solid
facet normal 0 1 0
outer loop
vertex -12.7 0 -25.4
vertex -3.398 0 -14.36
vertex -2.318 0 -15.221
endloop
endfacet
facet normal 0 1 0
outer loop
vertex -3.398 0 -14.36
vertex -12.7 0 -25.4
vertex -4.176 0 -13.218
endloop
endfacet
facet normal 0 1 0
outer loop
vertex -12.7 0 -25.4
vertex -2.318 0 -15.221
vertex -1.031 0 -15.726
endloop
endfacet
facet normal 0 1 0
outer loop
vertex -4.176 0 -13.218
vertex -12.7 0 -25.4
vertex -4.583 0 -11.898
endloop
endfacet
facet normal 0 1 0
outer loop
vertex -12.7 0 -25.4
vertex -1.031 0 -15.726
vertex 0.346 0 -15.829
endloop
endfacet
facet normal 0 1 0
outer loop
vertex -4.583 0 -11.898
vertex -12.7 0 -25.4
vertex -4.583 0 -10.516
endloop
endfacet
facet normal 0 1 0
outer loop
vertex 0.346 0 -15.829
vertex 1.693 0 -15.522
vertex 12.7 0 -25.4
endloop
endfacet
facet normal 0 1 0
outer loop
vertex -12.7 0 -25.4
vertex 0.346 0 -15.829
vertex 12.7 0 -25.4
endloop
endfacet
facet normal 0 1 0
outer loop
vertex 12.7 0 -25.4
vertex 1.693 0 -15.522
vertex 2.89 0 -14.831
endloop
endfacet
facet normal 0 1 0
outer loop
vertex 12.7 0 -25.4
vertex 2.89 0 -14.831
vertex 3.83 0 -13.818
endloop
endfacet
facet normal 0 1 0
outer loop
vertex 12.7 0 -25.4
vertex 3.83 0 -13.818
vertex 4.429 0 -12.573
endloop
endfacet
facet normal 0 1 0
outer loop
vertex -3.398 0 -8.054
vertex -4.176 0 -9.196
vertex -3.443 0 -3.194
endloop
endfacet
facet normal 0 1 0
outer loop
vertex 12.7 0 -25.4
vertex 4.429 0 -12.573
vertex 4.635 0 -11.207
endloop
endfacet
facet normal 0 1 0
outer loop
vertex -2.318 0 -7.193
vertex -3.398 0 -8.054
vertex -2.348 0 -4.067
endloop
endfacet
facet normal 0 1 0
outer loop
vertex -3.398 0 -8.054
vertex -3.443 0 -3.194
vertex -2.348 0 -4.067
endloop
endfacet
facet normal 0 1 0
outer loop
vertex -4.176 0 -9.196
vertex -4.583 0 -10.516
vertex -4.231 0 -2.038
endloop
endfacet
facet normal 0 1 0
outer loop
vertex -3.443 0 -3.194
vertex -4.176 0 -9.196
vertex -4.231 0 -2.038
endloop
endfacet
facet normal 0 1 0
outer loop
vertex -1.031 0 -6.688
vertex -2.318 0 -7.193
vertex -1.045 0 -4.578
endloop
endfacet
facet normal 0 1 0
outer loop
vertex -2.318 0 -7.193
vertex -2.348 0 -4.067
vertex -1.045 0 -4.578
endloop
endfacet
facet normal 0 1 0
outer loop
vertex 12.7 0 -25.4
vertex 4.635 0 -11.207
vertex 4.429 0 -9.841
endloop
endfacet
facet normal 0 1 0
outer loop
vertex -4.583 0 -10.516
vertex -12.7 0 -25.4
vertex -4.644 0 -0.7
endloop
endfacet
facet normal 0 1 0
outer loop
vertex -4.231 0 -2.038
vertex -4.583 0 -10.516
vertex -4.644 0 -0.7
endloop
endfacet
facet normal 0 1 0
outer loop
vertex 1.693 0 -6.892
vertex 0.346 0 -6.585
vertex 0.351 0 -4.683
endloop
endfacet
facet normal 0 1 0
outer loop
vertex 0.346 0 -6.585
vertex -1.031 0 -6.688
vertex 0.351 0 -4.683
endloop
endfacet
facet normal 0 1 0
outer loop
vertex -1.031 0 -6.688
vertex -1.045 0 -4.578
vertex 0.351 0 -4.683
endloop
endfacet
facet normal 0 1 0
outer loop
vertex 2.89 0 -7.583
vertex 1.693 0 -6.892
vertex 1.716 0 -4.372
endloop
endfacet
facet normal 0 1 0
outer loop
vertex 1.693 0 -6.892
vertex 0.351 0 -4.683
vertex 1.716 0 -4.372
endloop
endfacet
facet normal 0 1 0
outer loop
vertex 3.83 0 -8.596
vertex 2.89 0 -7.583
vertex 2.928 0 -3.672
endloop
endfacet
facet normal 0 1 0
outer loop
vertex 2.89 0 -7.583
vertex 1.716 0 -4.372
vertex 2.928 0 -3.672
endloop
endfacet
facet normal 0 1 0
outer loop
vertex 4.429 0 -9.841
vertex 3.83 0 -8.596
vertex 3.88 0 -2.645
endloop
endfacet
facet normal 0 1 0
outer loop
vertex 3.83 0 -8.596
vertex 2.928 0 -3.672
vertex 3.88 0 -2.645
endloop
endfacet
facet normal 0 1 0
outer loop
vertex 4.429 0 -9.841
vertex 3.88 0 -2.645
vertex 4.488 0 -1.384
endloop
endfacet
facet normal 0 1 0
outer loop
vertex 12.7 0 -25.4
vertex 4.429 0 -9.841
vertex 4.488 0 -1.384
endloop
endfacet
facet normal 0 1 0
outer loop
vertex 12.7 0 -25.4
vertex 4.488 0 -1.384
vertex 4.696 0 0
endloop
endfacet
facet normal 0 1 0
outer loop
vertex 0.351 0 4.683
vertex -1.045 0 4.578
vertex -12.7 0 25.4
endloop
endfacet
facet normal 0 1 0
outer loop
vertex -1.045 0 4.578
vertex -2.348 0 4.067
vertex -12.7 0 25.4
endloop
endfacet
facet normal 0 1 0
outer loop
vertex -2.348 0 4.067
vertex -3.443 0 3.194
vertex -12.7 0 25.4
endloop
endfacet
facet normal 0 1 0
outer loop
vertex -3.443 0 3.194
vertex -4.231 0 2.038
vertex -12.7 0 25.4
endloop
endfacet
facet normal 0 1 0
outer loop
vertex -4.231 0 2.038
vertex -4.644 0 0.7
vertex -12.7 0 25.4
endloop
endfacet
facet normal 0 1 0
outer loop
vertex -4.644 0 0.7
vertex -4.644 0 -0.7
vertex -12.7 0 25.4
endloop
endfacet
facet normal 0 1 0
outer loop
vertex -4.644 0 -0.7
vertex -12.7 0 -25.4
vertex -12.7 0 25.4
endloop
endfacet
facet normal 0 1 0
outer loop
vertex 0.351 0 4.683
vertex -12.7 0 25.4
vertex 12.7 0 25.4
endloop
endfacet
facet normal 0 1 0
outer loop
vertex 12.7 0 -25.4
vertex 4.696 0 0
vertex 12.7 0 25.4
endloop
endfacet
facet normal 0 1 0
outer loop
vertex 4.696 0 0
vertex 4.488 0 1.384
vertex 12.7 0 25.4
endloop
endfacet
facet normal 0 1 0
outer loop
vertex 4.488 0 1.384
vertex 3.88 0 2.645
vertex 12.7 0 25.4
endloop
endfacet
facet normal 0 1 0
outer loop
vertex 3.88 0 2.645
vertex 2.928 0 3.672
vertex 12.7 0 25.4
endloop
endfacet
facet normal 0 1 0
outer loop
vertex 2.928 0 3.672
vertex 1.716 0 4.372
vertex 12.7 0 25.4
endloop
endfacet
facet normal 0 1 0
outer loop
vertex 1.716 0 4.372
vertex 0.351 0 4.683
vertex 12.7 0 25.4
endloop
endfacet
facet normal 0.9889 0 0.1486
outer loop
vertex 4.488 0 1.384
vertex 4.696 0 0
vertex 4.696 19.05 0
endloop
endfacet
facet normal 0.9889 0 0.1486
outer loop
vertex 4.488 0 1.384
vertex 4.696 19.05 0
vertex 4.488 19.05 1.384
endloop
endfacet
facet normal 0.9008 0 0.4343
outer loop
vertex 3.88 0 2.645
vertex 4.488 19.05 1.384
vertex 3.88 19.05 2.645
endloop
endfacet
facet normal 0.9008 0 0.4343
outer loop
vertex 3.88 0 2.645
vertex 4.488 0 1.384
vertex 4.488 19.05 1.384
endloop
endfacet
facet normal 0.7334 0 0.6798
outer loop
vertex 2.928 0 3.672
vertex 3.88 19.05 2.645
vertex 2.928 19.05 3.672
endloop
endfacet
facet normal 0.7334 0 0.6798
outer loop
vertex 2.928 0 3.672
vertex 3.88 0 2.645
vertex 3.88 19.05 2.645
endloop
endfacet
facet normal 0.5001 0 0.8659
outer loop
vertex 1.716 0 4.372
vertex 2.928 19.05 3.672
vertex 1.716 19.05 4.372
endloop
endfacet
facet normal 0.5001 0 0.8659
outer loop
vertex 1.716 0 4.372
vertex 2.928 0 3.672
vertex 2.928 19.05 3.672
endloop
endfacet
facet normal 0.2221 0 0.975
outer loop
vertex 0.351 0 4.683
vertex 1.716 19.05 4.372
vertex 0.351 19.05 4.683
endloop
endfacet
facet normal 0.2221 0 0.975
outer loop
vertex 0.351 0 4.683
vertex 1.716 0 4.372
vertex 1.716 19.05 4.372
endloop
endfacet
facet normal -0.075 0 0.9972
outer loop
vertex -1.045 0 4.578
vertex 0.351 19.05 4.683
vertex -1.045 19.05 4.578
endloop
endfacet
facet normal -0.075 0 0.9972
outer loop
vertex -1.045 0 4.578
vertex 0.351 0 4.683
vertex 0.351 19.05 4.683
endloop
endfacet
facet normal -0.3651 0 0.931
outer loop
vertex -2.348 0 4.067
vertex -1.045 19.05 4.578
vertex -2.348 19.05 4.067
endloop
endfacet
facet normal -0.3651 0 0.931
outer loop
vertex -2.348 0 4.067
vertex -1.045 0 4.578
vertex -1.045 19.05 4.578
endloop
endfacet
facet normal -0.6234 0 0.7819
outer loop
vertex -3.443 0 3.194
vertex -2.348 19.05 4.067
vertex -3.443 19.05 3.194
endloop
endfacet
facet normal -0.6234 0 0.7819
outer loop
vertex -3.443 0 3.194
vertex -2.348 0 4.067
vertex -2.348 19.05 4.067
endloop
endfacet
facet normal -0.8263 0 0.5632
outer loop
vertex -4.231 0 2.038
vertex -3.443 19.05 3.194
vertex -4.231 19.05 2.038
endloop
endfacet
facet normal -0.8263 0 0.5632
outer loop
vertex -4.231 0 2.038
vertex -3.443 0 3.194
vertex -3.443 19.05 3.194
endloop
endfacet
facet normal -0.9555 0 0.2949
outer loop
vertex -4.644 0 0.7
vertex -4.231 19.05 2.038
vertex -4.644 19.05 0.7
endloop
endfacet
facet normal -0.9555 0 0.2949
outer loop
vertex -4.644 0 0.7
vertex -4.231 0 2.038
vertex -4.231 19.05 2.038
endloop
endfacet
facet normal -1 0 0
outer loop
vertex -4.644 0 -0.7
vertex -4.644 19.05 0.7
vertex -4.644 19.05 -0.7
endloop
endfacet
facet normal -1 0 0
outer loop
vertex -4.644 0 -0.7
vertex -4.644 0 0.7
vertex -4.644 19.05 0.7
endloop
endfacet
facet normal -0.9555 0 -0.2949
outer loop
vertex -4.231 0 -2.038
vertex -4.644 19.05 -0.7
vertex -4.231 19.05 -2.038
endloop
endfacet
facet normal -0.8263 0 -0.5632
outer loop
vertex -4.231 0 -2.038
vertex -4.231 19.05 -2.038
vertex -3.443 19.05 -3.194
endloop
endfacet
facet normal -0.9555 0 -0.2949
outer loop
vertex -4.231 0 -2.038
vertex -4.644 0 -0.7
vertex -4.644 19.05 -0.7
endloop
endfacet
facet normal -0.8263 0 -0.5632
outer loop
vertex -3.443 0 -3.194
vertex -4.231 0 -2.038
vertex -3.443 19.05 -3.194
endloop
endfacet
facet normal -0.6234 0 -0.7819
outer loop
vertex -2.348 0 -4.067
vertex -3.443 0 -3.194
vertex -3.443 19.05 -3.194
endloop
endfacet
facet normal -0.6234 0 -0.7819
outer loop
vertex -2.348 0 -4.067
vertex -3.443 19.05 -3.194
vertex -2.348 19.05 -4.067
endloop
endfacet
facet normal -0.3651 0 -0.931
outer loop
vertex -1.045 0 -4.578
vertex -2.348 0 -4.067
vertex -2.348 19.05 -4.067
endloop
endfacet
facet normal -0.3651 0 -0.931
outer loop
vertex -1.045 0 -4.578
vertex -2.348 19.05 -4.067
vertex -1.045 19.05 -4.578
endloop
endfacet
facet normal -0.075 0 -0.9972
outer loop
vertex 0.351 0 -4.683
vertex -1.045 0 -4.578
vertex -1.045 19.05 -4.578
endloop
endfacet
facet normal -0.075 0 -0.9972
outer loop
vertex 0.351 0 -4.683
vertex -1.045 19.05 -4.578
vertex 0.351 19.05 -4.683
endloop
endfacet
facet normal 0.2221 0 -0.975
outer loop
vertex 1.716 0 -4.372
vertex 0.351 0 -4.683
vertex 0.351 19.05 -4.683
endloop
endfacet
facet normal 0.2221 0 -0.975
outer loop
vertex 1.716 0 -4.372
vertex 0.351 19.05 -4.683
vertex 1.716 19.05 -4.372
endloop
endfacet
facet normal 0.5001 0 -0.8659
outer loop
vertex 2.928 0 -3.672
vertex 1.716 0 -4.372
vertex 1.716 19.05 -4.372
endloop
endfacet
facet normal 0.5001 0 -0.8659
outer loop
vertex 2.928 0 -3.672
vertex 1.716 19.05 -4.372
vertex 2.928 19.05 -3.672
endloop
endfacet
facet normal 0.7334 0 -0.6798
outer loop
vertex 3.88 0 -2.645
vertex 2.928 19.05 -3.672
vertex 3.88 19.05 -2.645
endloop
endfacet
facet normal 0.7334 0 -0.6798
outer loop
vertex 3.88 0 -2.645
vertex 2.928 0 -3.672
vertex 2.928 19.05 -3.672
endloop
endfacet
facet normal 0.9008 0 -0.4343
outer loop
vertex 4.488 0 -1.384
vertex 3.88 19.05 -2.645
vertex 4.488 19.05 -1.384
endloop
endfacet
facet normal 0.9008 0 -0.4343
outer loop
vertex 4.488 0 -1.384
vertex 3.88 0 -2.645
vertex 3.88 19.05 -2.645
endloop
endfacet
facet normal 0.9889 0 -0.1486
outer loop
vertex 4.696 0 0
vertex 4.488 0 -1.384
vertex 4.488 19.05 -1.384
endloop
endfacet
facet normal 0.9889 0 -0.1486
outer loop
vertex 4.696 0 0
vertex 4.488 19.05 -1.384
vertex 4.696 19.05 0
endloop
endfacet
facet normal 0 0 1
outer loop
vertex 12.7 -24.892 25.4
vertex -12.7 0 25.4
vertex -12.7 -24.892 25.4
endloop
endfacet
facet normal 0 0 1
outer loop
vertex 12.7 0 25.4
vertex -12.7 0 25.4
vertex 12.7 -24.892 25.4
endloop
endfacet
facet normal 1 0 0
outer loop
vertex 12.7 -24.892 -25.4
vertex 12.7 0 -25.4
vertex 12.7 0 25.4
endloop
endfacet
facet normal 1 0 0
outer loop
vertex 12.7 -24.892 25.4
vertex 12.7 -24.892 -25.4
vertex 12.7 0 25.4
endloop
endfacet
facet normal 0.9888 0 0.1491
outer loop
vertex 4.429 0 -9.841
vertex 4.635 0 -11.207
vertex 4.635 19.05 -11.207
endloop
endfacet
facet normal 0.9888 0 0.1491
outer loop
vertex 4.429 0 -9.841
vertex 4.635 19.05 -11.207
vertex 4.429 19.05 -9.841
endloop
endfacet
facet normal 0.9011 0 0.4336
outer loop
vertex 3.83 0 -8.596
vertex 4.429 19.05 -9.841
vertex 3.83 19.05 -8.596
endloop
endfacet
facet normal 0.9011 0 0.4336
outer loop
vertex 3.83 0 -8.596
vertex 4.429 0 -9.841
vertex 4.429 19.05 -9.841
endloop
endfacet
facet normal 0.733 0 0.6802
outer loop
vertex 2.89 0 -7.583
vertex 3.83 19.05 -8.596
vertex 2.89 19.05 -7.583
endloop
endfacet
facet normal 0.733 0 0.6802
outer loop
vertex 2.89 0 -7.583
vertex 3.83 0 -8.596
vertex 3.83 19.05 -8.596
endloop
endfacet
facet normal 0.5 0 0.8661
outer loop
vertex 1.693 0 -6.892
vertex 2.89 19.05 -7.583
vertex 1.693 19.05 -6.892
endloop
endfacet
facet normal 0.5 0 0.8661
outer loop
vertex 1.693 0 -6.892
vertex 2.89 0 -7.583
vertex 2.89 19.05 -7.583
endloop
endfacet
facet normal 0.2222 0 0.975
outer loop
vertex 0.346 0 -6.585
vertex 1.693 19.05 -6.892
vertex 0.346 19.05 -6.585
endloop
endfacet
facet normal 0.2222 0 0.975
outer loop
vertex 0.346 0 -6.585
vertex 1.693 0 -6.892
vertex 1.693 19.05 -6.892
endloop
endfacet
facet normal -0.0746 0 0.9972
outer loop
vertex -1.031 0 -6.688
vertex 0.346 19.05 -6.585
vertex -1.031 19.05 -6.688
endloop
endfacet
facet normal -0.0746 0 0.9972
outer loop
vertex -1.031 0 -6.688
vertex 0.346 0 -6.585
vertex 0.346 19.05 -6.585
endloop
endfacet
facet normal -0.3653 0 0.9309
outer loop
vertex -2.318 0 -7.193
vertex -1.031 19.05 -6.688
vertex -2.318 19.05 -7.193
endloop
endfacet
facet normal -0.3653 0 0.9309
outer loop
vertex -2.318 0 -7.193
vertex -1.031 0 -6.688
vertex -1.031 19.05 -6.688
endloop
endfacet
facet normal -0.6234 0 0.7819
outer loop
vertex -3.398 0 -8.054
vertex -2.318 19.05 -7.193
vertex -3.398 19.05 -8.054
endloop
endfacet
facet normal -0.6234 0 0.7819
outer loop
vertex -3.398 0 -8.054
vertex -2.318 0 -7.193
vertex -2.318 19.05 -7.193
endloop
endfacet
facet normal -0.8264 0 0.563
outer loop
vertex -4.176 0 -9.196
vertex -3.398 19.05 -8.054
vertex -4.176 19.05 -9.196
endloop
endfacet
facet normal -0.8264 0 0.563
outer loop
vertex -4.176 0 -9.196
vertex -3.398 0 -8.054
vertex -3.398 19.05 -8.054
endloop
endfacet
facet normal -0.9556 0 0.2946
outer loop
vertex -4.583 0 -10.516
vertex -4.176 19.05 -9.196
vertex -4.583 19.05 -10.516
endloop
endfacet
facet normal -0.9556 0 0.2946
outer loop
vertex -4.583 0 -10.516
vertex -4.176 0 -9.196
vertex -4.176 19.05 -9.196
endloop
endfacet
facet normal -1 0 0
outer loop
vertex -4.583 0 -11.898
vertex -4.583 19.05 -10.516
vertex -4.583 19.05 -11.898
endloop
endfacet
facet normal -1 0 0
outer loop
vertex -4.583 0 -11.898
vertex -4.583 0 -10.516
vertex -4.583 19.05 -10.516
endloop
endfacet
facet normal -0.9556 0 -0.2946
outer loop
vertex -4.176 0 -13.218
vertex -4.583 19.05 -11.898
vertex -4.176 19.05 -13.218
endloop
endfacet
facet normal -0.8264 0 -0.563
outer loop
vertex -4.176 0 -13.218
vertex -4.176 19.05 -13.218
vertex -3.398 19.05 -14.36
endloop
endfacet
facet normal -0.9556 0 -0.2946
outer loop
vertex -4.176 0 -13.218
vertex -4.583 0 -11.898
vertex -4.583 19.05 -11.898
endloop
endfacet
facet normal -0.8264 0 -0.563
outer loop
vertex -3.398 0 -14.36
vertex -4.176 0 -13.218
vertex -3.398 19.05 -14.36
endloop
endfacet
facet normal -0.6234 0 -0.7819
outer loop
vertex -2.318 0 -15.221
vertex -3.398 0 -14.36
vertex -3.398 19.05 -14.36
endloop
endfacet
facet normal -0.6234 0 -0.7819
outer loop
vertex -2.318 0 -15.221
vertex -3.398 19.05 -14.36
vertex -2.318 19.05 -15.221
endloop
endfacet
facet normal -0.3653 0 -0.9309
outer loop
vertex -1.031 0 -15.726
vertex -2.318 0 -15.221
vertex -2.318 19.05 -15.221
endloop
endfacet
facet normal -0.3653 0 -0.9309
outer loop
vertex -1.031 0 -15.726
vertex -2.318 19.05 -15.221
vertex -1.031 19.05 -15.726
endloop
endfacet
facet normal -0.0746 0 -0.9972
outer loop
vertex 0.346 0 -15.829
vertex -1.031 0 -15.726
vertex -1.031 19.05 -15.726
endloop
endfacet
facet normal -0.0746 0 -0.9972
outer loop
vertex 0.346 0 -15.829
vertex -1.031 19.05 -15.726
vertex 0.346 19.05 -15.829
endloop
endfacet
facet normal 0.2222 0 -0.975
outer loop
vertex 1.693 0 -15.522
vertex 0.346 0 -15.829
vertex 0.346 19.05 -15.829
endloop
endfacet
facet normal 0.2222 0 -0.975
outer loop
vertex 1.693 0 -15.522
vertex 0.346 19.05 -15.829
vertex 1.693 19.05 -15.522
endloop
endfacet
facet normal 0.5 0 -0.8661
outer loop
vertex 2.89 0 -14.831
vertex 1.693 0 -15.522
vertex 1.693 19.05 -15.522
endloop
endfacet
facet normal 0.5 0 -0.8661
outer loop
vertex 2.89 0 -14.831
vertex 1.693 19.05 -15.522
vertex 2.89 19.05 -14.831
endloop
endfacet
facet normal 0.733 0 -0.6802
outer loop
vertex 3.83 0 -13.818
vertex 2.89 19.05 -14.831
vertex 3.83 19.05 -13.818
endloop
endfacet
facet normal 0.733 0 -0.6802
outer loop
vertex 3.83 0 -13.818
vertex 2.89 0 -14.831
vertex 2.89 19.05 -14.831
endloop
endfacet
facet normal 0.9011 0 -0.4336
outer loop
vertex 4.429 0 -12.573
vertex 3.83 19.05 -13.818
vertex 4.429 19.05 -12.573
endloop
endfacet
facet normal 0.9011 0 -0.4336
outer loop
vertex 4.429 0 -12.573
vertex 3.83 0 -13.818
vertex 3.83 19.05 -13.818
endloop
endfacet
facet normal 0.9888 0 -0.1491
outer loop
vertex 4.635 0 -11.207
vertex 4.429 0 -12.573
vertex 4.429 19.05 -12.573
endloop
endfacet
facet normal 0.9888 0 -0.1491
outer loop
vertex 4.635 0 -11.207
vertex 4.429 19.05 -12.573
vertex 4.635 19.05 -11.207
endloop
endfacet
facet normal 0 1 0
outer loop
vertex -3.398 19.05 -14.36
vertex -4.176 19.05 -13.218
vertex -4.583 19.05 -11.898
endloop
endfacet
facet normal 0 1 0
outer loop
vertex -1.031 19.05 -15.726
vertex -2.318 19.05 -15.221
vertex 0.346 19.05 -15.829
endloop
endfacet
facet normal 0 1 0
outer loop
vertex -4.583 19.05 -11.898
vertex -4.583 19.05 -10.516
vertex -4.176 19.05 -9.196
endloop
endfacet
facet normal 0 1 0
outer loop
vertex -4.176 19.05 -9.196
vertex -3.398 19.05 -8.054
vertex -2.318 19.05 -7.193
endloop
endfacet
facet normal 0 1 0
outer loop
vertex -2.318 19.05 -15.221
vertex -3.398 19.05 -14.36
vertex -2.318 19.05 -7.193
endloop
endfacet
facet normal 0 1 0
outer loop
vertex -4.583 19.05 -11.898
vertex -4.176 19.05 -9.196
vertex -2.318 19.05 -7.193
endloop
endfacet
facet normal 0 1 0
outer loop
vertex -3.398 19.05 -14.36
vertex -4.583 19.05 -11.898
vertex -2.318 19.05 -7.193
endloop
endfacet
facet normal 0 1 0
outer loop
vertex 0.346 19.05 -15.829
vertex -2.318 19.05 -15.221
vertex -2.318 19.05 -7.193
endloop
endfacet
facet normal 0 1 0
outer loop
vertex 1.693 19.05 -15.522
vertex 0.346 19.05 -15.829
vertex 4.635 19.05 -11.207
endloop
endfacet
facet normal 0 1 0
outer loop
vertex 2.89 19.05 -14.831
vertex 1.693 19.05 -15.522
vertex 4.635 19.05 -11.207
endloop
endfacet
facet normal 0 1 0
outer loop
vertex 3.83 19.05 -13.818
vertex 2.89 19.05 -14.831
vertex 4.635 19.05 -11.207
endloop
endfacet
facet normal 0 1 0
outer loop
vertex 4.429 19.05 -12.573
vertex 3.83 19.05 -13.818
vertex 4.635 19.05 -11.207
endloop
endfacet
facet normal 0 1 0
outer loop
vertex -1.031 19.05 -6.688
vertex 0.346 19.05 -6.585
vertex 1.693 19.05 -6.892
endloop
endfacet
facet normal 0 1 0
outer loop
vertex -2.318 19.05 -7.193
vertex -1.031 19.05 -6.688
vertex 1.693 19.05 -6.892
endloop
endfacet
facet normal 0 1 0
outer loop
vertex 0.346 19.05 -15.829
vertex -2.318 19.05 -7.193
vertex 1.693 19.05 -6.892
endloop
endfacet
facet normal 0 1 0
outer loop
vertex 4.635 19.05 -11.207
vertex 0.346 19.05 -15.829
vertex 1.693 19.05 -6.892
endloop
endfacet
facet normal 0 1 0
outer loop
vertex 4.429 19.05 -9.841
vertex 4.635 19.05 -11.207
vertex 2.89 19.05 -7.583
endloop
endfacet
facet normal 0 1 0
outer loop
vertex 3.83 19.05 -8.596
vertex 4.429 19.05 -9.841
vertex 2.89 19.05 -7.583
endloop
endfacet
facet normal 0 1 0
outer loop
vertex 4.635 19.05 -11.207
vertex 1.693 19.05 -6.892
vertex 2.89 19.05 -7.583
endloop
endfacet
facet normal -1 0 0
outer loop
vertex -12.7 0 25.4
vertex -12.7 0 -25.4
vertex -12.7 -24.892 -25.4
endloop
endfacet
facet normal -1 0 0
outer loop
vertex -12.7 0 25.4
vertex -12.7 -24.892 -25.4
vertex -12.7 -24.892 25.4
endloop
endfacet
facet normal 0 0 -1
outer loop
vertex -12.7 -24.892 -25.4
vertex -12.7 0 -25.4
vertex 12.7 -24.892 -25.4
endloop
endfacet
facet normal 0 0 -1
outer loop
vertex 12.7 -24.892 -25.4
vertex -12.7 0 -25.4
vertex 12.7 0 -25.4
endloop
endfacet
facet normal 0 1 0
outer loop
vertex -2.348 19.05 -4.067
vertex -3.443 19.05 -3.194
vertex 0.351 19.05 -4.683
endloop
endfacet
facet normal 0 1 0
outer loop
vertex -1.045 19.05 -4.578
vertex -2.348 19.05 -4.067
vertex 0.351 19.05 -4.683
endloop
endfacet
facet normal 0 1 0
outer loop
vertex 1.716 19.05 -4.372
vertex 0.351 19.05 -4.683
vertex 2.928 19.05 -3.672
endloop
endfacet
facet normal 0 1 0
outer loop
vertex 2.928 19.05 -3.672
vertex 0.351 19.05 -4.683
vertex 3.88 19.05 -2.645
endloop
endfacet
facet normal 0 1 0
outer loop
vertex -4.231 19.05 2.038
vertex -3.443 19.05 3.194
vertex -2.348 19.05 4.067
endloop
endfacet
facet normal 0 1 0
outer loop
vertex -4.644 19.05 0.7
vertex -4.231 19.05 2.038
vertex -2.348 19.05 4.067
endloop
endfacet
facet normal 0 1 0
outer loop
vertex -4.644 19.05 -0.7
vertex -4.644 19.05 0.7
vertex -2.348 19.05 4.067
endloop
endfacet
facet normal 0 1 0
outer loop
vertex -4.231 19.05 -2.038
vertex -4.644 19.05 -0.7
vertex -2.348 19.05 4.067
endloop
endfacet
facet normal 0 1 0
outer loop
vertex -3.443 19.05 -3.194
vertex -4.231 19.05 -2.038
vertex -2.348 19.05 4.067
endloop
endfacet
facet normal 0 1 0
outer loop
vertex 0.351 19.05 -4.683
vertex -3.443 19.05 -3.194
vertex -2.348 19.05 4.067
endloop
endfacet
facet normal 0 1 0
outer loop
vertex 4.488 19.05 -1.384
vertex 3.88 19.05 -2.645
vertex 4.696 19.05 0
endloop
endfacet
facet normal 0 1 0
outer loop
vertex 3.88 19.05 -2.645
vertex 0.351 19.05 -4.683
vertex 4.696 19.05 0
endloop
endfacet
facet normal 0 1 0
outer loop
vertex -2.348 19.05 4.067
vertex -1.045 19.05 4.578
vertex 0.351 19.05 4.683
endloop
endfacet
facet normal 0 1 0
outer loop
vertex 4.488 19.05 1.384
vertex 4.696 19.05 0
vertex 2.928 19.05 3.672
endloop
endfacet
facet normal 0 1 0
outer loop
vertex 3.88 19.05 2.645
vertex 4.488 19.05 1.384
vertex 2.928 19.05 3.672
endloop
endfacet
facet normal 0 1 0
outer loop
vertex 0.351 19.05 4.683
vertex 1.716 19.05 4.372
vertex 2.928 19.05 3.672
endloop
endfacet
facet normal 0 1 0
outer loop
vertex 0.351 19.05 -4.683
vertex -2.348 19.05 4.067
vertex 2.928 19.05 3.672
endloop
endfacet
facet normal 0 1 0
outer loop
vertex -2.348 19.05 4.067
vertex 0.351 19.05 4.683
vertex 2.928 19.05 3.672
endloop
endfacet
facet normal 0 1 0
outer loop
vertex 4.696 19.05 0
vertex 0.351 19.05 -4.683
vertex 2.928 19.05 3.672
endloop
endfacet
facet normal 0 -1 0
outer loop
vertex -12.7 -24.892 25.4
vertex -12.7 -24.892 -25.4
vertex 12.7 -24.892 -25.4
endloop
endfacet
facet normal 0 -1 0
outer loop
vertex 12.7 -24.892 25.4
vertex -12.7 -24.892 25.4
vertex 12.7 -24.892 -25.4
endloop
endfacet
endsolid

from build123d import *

# Parameters (mm, degrees)
F0_W     = 25.4
F0_H     = 50.8
F1_DEPTH = 24.892
F2_R     = 4.6961896277
F2_R_2   = 4.6352376904
F3_DEPTH = 19.05


# Not quite as in the source:
# - a feature names something its author has since deleted; it is built from what else it names


with BuildPart() as f1:
    # F0 (on Front) → F1 (new body)
    with BuildSketch(Plane.XZ):
        Rectangle(F0_W, F0_H)
    extrude(amount=F1_DEPTH)

    # F2 (on Front) → F3 (join)
    with BuildSketch(Plane.XZ):
        Circle(F2_R)
        with Locations((0, -11.2072117627)):
            Circle(F2_R_2)
    extrude(amount=-F3_DEPTH)


solid = f1.part
